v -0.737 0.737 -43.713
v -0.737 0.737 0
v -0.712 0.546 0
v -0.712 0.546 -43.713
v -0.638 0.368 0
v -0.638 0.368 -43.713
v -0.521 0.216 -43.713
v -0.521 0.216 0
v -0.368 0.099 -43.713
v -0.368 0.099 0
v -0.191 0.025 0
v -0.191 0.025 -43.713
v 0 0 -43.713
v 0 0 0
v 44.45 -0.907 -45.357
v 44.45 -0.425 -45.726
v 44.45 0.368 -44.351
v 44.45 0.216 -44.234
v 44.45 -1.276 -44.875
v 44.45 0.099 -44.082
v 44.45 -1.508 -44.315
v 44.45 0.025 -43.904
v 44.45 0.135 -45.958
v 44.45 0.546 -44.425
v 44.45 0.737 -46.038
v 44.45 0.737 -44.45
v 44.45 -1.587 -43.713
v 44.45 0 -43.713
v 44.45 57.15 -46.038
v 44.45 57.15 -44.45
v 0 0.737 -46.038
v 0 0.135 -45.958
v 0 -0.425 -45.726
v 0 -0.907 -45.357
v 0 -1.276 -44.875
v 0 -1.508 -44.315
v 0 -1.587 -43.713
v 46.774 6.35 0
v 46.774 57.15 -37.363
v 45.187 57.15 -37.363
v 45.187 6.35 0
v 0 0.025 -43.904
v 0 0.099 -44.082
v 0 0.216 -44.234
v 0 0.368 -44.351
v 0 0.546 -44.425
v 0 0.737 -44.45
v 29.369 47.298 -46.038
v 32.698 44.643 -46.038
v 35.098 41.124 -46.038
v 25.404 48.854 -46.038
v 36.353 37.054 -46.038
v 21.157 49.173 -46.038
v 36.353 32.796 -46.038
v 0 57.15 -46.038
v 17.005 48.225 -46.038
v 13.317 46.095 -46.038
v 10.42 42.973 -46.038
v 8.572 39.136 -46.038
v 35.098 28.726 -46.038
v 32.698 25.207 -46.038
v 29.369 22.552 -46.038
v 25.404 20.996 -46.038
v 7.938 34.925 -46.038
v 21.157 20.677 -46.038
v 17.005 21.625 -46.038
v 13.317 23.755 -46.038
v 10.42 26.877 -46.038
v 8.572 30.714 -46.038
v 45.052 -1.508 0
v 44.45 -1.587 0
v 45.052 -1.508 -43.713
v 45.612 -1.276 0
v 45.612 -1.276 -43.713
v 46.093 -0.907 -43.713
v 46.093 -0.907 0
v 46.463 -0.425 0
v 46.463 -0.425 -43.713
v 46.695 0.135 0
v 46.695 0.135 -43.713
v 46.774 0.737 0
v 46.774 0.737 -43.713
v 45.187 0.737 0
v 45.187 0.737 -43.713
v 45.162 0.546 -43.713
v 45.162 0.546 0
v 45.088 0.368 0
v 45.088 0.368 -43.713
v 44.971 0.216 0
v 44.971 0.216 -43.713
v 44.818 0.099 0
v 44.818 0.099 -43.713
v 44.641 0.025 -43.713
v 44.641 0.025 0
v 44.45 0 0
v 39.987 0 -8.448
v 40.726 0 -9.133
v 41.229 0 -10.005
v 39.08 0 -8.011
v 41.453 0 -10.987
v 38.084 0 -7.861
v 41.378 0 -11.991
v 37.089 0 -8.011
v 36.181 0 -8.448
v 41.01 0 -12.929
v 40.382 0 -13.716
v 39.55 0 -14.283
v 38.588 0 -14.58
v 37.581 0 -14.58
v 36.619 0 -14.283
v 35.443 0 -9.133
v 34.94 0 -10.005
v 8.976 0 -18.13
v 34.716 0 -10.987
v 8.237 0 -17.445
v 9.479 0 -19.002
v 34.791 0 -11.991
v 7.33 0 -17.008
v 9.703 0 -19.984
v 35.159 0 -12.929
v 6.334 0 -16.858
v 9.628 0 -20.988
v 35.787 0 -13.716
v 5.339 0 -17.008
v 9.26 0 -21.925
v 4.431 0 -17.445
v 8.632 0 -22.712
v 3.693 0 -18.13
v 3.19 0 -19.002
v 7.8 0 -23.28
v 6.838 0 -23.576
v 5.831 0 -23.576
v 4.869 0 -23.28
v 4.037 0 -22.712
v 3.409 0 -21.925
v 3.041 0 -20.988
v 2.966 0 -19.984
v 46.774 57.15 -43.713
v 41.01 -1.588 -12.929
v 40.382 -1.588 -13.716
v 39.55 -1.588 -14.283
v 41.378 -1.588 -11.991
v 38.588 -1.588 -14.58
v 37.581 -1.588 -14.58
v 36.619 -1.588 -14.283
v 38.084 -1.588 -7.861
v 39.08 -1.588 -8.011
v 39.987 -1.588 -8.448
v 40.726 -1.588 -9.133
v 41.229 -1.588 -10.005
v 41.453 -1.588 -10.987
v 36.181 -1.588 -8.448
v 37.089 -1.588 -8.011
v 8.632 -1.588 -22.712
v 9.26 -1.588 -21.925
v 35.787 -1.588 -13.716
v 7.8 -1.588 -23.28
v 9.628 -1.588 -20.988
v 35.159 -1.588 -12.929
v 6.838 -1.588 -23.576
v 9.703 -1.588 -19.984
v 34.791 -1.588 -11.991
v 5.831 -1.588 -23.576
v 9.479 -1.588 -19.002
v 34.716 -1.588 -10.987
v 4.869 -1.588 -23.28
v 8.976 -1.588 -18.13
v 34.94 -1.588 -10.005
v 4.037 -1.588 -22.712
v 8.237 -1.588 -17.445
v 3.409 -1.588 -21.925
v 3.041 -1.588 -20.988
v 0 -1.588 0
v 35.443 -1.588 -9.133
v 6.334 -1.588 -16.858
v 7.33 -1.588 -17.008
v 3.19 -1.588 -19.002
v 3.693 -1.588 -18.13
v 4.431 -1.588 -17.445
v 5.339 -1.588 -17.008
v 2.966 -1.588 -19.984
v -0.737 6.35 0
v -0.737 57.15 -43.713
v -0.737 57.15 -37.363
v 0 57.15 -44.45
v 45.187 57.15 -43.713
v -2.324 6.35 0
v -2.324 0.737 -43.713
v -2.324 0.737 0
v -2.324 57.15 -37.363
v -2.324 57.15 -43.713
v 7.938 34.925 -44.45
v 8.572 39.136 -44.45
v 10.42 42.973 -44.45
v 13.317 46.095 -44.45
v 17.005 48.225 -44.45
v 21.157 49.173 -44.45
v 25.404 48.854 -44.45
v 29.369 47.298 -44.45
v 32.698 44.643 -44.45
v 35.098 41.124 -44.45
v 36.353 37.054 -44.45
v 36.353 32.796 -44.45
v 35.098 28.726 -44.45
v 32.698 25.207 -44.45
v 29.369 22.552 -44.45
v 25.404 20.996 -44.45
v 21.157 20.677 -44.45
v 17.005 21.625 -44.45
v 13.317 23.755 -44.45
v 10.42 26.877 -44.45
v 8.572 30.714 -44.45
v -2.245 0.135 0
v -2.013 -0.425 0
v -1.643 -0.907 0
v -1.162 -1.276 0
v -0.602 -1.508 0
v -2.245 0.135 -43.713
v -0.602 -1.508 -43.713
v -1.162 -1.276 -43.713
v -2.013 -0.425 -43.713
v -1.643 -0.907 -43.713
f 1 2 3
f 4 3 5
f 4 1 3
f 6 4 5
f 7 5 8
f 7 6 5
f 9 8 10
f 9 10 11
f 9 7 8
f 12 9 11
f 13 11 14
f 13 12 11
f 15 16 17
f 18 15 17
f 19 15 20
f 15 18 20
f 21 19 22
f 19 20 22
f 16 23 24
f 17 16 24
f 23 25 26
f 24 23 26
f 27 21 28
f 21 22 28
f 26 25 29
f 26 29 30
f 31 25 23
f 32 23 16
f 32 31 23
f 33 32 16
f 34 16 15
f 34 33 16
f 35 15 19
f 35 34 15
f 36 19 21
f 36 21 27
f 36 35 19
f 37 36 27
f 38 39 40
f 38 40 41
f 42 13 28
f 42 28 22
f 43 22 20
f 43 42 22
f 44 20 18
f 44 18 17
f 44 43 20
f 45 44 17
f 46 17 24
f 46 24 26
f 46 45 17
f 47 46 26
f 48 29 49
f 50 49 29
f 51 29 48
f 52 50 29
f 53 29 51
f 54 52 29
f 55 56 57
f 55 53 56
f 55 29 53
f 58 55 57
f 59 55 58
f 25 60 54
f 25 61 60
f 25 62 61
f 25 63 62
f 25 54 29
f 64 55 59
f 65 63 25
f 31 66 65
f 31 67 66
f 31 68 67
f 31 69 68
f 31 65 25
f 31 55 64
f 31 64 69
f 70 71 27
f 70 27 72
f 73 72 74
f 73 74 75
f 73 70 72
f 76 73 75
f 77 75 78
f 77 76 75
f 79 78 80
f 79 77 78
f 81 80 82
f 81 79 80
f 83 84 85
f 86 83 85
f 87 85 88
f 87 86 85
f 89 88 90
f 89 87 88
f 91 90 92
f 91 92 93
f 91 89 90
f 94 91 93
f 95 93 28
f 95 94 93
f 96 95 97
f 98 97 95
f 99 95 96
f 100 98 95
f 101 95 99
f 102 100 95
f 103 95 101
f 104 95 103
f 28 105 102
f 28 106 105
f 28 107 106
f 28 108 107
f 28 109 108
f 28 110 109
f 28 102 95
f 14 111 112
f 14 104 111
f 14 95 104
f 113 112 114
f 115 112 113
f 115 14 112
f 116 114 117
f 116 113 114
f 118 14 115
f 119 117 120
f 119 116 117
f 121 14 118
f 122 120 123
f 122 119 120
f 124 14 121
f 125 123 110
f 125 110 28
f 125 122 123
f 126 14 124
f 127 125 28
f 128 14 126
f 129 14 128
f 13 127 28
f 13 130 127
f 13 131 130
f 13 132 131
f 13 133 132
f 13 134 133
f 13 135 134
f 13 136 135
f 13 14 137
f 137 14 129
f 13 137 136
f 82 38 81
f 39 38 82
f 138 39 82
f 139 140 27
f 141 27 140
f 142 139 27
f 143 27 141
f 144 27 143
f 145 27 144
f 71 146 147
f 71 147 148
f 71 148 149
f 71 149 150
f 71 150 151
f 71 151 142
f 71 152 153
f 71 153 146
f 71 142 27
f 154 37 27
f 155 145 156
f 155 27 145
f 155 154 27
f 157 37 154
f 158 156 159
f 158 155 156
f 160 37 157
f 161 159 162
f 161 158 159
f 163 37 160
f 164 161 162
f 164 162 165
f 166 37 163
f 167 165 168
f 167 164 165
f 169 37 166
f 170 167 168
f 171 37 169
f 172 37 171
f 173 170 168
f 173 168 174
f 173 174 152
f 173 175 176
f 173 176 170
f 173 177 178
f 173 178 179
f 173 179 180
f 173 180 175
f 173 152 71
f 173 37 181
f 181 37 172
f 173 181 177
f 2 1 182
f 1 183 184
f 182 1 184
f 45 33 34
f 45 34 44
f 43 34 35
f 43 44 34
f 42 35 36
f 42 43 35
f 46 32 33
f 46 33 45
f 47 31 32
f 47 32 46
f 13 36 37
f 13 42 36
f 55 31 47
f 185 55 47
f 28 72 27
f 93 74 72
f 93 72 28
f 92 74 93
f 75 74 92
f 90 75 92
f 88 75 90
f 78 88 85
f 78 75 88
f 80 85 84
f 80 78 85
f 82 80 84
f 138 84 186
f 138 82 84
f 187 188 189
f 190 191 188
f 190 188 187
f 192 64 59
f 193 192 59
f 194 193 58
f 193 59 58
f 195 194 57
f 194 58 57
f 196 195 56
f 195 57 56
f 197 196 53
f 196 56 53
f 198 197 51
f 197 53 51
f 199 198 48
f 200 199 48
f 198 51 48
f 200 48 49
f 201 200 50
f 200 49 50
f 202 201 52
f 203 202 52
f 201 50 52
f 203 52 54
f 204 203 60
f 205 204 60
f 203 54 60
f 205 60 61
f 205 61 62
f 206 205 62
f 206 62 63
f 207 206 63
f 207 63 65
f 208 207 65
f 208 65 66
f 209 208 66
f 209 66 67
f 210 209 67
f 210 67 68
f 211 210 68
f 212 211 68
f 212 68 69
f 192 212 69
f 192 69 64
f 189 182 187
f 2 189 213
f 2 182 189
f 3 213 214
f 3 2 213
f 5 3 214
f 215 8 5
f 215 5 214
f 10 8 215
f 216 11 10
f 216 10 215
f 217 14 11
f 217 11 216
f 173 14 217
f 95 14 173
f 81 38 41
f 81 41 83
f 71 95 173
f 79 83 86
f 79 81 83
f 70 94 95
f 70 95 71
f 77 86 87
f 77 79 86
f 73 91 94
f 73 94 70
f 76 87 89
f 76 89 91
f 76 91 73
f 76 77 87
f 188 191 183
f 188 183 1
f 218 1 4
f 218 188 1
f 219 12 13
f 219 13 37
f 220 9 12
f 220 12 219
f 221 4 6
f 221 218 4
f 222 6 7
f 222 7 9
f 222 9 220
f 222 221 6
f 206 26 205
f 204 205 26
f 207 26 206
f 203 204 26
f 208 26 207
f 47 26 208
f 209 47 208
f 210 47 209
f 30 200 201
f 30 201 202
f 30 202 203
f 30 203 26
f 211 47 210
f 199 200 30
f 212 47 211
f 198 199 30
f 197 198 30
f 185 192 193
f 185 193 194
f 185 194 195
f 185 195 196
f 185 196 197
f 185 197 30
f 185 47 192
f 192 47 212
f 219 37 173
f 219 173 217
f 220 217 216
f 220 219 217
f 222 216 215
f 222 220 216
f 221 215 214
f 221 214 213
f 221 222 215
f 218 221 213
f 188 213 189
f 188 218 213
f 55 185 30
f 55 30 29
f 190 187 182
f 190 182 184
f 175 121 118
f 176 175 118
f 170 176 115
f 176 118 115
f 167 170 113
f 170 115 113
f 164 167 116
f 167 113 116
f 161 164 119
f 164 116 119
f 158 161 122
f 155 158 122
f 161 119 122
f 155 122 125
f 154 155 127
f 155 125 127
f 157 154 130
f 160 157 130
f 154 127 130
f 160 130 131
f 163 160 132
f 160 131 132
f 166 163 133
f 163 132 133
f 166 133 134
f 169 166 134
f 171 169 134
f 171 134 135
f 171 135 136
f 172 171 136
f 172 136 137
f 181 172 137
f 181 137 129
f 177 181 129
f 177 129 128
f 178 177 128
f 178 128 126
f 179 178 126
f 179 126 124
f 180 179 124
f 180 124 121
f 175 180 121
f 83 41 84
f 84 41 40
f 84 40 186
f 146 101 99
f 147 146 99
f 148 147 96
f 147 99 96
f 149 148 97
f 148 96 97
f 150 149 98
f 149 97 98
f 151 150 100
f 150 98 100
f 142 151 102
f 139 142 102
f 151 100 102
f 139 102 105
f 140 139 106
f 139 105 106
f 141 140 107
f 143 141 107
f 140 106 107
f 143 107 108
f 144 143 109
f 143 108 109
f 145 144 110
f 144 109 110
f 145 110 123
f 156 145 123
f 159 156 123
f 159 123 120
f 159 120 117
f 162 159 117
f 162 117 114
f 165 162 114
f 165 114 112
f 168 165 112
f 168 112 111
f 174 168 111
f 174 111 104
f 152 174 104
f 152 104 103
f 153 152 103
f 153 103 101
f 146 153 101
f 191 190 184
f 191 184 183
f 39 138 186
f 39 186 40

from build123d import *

# Parameters (mm, degrees)
BASE_FLANGE1_DEPTH        = 44.45
EDGE_FLANGE1_DEPTH        = 43.7134
EDGE_FLANGE1_START        = 1.5875
EDGE_FLANGE1_FLAT_DEPTH   = 1.5875
EDGE_FLANGE1_BEND_DEPTH   = 43.7134
EDGE_FLANGE1_FLAT_2_DEPTH = 1.5875
SKETCH12_R                = 14.2875
CUT_EXTRUDE1_DEPTH        = 88.025228164
SKETCH13_R                = 3.3782
CUT_EXTRUDE2_DEPTH        = 88.025228164


# Sheet-metal steps are written as plain solids
with BuildPart() as part:
    # Sketch1 → Base-Flange1 (new body)
    with BuildSketch(Plane(origin=(0, 0, 0), x_dir=(0, 0, -1), z_dir=(1, 0, 0))):
        with BuildLine():
            Line((0, 0), (43.7134, 0))
            ThreePointArc((43.7134, 0), (44.234254855, 0.215745145), (44.45, 0.7366))
            Line((44.45, 0.7366), (44.45, 57.15))
            Line((44.45, 57.15), (46.0375, 57.15))
            Line((46.0375, 57.15), (46.0375, 0.7366))
            ThreePointArc((46.0375, 0.7366), (45.35678687, -0.90678687), (43.7134, -1.5875))
            Line((43.7134, -1.5875), (0, -1.5875))
            Line((0, -1.5875), (0, 0))
        make_face()
    extrude(amount=BASE_FLANGE1_DEPTH)

    # Edge-Flange1 bend section (across the edge) → Edge-Flange1 (add)
    with BuildSketch(Plane(origin=(-0.7366, 0, -43.7134), x_dir=(1, 0, 0), z_dir=(0, 0, 1))):
        with BuildLine():
            Line((-1.5875, 0.7366), (0, 0.7366))
            ThreePointArc((0, 0.7366), (0.215745145, 0.215745145), (0.7366, 0))
            Line((0.7366, 0), (0.7366, -1.5875))
            ThreePointArc((0.7366, -1.5875), (-0.90678687, -0.90678687), (-1.5875, 0.7366))
        make_face()
    extrude(amount=EDGE_FLANGE1_DEPTH)

    # Edge-Flange1 profile (on flange) → Edge-Flange1 flat (add)
    with BuildSketch(Plane.ZY.offset(0.7366).offset(EDGE_FLANGE1_START)):
        Polygon((0, 0.7366), (0, 6.35), (-37.3634, 57.15), (-43.7134, 57.15), (-43.7134, 0.7366), align=None)
    extrude(amount=-EDGE_FLANGE1_FLAT_DEPTH)

    # Edge-Flange1 bend section 2 (across the edge) → Edge-Flange1 bend (add)
    with BuildSketch(Plane(origin=(45.1866, 0, 0), x_dir=(-1, 0, 0), z_dir=(0, 0, -1))):
        with BuildLine():
            Line((-1.5875, 0.7366), (0, 0.7366))
            ThreePointArc((0, 0.7366), (0.215745145, 0.215745145), (0.7366, 0))
            Line((0.7366, 0), (0.7366, -1.5875))
            ThreePointArc((0.7366, -1.5875), (-0.90678687, -0.90678687), (-1.5875, 0.7366))
        make_face()
    extrude(amount=EDGE_FLANGE1_BEND_DEPTH)

    # Edge-Flange1 profile 2 (on flange) → Edge-Flange1 flat 2 (add)
    with BuildSketch(Plane(origin=(45.1866, 0, 0), x_dir=(0, 0, -1), z_dir=(1, 0, 0)).offset(EDGE_FLANGE1_START)):
        Polygon((0, 6.35), (0, 0.7366), (43.7134, 0.7366), (43.7134, 57.15), (37.3634, 57.15), align=None)
    extrude(amount=-EDGE_FLANGE1_FLAT_2_DEPTH)

    # Sketch12 → Cut-Extrude1 (cut, through all)
    with BuildSketch(Plane(origin=(0, 0, -46.0375), x_dir=(-1, 0, 0), z_dir=(0, 0, -1))):
        with Locations((-22.225, 34.925)):
            Circle(SKETCH12_R)
    extrude(amount=-CUT_EXTRUDE1_DEPTH, mode=Mode.SUBTRACT)

    # Sketch13 → Cut-Extrude2 (cut, through all)
    with BuildSketch(Plane(origin=(0, 0, 0), x_dir=(1, 0, 0), z_dir=(0, 1, 0))):
        with Locations(Location((38.0844298, 11.2395, 0), (0, 0, 270))):
            Circle(SKETCH13_R)
        with Locations(Location((6.3344298, 20.235970884, 0), (0, 0, 270))):
            Circle(SKETCH13_R)
    extrude(amount=-CUT_EXTRUDE2_DEPTH, mode=Mode.SUBTRACT)


solid = part.part
